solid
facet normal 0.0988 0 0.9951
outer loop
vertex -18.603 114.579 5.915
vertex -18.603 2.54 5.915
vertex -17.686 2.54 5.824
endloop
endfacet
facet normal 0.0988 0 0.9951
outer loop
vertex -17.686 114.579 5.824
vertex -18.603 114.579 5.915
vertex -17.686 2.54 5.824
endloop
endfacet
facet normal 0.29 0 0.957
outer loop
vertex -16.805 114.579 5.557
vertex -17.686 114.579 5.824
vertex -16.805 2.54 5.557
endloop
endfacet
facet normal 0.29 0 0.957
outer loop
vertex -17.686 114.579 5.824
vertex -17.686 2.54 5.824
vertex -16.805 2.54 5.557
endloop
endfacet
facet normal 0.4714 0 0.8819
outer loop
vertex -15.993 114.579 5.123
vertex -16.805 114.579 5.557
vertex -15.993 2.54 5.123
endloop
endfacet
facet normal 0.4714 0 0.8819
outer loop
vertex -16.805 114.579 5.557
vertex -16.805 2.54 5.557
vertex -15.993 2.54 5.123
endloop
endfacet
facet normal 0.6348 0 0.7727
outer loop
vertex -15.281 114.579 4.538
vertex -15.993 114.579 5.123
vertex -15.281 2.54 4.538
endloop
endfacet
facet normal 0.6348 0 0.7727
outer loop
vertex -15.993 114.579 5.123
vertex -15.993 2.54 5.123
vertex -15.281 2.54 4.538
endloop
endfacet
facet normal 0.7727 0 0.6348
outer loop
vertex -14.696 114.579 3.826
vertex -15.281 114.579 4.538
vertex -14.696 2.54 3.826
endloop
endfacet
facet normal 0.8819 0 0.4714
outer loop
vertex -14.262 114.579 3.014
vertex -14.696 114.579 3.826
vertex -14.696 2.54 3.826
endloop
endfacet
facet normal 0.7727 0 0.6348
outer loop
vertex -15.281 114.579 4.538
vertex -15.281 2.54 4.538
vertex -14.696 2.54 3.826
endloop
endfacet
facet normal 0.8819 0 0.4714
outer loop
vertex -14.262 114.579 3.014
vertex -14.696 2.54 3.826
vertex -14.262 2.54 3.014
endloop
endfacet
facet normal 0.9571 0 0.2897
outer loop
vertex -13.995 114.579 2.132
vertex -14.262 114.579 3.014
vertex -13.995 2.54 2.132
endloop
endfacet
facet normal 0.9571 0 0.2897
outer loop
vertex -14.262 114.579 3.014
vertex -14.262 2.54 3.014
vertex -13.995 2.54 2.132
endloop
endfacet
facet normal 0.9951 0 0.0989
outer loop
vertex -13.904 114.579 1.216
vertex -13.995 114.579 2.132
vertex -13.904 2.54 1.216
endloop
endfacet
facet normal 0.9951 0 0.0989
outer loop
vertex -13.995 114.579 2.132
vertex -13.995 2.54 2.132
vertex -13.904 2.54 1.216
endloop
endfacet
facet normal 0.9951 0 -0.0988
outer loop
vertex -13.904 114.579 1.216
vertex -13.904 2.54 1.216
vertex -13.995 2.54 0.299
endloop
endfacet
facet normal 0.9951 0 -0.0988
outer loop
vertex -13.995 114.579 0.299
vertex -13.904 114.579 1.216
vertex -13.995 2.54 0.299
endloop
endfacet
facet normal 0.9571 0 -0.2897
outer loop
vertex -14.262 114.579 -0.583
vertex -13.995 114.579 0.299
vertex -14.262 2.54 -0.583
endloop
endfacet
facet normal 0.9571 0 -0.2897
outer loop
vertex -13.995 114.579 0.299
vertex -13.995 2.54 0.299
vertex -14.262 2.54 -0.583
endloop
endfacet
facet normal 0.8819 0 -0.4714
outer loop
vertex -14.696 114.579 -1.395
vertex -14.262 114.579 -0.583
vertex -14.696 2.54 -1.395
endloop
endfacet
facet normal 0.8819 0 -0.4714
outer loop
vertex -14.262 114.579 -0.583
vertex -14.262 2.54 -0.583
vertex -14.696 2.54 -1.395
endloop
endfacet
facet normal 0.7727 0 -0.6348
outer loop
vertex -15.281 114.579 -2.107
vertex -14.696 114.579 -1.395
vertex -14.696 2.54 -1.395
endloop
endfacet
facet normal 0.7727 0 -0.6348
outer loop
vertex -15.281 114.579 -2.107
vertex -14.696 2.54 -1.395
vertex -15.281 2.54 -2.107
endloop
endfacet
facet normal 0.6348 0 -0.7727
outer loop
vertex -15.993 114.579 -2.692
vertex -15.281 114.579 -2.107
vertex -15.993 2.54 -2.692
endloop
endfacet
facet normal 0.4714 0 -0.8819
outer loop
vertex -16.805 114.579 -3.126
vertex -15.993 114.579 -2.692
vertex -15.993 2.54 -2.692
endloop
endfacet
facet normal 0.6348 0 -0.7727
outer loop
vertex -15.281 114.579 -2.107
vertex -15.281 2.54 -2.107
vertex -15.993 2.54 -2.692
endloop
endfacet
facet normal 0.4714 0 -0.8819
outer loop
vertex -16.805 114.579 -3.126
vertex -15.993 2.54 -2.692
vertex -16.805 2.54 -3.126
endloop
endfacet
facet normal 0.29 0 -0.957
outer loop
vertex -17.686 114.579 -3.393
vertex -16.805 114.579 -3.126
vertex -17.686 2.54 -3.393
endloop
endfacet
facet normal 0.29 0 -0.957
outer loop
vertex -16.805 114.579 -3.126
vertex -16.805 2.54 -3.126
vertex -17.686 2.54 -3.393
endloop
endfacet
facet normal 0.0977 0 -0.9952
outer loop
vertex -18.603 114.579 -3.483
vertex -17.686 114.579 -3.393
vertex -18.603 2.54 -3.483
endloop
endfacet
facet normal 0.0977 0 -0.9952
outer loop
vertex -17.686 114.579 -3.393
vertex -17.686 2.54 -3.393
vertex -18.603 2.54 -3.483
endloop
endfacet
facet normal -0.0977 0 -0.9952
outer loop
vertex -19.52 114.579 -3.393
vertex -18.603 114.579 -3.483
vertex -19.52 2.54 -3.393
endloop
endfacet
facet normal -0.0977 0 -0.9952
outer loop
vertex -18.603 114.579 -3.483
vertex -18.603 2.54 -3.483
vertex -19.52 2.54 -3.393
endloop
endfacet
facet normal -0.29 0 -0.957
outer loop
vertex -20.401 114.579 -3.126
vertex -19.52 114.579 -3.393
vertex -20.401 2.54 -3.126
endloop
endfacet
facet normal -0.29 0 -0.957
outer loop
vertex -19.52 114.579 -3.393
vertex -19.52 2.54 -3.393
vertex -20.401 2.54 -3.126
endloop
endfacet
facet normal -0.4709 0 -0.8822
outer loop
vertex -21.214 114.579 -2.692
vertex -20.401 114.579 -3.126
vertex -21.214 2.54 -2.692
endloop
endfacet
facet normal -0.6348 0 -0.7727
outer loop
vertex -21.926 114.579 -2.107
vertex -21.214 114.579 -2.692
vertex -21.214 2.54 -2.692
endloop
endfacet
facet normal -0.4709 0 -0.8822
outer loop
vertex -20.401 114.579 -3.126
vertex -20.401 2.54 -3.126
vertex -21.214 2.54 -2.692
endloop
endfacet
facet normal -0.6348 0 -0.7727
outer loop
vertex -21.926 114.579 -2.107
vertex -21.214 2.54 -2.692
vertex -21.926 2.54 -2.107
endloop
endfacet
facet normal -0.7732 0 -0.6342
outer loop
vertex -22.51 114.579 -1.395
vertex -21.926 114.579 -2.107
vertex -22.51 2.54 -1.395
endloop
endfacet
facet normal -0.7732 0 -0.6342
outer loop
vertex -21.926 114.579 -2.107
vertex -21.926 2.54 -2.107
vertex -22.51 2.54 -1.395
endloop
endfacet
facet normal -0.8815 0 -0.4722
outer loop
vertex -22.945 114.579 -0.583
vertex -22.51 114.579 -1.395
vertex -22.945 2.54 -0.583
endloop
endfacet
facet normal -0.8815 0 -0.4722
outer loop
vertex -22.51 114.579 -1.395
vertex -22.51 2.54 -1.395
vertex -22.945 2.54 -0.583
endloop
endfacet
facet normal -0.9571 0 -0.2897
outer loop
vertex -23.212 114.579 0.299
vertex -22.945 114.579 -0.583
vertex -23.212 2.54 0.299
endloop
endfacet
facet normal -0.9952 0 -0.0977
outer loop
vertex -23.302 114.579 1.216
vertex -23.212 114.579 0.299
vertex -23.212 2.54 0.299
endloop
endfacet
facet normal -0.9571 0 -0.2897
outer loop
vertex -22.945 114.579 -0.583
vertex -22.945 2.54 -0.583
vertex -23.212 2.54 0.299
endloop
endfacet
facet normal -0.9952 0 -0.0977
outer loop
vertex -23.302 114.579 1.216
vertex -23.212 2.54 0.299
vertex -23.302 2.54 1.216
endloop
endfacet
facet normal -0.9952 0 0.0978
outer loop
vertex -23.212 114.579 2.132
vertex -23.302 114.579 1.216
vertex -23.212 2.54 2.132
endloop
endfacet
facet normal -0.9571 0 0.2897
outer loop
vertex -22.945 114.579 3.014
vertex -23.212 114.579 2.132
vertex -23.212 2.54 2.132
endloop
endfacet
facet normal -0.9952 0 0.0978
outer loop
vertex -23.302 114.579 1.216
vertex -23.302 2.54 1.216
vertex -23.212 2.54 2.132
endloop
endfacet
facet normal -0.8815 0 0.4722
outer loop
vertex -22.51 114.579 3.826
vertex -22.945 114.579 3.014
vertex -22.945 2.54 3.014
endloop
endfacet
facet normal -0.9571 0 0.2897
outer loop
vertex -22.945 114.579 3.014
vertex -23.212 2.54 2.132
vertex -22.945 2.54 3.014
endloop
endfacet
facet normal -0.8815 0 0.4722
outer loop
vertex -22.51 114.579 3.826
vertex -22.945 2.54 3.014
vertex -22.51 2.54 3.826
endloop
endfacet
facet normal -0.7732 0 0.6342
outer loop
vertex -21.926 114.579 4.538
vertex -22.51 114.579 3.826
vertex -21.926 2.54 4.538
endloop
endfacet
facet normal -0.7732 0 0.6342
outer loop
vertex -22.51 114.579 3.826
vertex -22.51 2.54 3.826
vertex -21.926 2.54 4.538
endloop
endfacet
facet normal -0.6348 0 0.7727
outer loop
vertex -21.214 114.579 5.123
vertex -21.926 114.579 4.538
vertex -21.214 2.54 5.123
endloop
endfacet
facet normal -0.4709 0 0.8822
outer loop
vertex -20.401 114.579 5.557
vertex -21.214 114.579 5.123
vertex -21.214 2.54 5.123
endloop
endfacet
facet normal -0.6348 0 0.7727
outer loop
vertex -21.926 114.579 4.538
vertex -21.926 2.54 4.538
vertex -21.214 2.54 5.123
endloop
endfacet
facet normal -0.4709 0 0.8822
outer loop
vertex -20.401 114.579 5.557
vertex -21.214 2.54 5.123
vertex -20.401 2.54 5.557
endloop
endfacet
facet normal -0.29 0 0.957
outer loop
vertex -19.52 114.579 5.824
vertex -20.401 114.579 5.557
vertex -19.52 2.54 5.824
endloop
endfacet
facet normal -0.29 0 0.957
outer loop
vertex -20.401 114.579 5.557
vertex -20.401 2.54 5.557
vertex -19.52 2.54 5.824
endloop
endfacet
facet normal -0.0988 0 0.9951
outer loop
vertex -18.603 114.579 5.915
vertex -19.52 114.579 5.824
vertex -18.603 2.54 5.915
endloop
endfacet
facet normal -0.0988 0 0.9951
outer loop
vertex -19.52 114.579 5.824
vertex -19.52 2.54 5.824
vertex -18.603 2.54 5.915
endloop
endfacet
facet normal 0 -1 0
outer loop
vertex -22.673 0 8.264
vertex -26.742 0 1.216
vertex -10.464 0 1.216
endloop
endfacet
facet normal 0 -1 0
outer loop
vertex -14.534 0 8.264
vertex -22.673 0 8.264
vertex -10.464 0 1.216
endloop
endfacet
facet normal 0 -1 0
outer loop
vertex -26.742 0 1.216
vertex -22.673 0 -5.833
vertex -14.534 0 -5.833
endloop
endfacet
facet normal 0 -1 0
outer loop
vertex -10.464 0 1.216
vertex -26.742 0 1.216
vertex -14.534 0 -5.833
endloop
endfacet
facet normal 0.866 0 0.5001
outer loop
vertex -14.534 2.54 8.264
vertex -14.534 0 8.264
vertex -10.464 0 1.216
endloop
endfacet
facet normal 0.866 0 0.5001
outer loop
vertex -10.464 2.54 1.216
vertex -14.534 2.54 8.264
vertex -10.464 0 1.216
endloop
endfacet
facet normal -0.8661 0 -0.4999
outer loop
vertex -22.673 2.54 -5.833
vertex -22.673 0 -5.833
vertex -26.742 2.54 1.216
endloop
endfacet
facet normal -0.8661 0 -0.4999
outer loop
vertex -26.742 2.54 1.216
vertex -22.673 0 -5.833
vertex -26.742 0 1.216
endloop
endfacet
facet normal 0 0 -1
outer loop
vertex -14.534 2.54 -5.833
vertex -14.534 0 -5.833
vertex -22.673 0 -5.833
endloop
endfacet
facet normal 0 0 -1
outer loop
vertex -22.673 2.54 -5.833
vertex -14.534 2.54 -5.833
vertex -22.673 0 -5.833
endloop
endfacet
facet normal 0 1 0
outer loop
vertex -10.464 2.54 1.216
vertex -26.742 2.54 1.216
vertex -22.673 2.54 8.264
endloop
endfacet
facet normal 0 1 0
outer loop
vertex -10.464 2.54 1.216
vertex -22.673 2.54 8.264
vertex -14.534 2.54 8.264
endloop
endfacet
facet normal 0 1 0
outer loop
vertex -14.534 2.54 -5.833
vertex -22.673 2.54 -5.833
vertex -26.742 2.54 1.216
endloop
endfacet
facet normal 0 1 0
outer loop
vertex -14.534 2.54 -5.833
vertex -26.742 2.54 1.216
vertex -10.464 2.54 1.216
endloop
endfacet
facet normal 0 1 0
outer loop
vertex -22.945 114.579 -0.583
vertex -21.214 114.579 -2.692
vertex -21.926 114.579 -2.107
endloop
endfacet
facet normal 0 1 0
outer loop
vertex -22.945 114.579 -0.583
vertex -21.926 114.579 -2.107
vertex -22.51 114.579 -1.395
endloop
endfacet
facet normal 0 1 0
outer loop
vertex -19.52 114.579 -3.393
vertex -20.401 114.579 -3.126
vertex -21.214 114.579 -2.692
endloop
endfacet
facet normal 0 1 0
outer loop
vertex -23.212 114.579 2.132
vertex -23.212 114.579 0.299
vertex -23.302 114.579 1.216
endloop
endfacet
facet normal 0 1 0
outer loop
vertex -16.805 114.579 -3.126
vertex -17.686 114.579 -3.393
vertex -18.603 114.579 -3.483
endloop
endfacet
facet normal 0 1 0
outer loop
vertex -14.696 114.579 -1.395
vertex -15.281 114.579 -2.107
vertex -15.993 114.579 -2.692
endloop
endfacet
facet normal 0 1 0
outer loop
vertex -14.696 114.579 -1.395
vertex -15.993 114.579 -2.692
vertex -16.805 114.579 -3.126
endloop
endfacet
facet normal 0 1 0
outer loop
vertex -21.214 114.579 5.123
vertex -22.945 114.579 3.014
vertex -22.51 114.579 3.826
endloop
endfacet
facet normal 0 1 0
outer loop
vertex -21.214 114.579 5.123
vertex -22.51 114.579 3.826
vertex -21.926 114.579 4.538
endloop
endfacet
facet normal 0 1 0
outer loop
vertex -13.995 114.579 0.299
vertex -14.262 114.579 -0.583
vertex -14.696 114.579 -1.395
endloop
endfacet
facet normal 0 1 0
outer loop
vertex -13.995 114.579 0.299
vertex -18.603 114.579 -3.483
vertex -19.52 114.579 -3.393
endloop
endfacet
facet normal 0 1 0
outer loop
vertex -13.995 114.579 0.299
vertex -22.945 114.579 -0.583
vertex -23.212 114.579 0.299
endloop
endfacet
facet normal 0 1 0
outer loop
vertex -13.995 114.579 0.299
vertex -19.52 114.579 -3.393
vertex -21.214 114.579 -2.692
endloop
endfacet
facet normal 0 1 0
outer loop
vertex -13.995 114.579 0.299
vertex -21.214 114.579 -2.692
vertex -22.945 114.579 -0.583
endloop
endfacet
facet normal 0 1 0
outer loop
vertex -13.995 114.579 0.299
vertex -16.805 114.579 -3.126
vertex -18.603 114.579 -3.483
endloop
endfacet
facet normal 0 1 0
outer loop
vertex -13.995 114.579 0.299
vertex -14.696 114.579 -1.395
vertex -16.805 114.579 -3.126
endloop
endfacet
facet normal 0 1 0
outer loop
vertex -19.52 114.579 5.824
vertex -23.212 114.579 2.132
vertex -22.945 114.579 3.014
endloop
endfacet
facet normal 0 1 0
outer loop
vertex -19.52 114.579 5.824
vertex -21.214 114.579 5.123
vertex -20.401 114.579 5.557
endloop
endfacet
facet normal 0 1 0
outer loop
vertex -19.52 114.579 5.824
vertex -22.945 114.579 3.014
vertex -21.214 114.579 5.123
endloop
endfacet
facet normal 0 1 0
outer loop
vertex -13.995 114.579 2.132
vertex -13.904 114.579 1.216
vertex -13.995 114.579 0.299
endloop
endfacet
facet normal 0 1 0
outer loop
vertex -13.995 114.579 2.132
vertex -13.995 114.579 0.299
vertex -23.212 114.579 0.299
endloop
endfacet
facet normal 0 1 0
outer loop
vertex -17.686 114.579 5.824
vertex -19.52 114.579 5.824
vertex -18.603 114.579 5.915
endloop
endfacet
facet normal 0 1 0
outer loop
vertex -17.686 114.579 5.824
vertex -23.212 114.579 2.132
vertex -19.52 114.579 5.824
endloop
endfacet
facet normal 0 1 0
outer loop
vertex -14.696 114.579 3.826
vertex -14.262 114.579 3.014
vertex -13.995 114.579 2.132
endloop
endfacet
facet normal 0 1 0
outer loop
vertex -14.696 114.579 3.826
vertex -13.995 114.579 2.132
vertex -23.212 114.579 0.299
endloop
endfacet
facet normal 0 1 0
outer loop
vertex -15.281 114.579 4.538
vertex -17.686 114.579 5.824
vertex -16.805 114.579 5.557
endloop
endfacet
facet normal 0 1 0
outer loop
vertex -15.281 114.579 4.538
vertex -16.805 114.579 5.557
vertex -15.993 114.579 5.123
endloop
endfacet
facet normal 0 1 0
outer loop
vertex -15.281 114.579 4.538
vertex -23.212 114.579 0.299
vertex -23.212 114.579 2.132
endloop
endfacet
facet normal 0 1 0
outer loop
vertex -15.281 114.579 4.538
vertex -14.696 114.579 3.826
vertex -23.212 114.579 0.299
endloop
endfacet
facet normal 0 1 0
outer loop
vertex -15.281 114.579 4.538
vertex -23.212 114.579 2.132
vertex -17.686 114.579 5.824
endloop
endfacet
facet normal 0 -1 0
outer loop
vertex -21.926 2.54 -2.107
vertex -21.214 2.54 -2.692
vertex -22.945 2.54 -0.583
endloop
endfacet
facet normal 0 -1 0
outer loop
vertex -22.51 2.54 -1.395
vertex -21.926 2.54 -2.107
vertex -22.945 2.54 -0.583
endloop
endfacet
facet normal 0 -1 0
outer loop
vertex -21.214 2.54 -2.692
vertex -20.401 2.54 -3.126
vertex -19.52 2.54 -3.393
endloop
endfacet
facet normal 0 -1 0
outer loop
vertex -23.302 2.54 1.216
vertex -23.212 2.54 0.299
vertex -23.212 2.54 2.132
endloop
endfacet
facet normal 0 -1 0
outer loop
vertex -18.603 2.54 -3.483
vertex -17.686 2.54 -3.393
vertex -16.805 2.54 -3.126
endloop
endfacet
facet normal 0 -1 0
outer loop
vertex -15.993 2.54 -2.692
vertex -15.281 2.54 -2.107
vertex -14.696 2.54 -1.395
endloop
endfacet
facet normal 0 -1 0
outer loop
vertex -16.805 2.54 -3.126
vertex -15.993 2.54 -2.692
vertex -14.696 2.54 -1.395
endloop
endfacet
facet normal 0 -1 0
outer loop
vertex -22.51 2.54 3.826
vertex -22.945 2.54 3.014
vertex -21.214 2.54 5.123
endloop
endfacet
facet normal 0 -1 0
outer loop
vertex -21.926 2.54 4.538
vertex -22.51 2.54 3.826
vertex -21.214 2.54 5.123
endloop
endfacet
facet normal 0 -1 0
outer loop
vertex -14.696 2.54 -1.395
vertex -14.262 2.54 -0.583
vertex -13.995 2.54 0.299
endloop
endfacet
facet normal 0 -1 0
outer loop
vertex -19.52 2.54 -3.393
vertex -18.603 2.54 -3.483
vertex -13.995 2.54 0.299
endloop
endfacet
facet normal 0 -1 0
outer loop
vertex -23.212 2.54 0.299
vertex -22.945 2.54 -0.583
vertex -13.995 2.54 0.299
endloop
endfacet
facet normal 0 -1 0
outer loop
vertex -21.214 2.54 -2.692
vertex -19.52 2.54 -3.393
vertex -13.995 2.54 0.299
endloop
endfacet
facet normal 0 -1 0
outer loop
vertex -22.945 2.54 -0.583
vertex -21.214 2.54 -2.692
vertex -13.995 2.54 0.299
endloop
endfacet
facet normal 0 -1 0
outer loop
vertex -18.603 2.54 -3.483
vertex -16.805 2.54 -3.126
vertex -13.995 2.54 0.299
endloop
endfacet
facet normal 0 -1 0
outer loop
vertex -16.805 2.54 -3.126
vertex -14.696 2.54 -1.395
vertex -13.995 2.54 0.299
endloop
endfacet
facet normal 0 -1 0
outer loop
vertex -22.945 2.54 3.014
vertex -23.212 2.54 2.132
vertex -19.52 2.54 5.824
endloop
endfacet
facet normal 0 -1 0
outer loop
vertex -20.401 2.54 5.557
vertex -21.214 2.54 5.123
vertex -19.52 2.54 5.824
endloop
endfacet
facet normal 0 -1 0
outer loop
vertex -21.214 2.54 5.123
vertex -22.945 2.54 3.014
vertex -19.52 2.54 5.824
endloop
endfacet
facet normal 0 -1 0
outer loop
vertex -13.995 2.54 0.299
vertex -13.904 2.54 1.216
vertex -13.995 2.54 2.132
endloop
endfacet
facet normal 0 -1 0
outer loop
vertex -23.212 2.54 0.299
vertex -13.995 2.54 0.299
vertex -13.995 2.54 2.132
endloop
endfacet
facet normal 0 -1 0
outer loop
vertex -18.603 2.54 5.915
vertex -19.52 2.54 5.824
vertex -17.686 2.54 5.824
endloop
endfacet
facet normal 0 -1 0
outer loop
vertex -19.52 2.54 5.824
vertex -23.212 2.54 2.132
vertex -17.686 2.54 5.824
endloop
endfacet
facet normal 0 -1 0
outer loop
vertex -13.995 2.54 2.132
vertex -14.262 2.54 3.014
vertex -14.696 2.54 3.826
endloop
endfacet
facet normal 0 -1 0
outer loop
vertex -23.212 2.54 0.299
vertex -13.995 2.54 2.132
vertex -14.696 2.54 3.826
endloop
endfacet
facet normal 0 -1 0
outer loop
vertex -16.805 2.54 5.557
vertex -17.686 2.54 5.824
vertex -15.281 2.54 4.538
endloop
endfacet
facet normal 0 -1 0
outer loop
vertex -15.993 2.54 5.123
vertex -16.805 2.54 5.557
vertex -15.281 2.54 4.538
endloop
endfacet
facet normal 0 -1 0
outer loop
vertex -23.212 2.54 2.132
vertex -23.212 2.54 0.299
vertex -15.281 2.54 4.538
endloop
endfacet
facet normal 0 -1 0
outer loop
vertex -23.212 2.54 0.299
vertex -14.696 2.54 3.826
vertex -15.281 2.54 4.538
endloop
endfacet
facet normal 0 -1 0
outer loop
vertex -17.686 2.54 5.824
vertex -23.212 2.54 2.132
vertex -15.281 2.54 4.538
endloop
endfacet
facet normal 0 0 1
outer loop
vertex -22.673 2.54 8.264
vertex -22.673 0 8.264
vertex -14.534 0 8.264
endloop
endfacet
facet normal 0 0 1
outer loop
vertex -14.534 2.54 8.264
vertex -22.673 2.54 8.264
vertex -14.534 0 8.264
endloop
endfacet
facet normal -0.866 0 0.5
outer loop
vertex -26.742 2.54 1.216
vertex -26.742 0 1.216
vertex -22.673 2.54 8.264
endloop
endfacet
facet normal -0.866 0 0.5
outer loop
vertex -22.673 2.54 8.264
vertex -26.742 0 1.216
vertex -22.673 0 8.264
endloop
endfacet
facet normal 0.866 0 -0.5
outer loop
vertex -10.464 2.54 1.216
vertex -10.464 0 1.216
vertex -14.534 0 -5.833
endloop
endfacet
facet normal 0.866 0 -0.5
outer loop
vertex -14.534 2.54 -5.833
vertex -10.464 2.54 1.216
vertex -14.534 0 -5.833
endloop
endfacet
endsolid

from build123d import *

# Parameters (mm, degrees)
BOSS_EXTRUDE1_DEPTH = 2.54
SKETCH2_R           = 4.699
BOSS_EXTRUDE2_DEPTH = 112.0394


with BuildPart() as part:
    # Sketch1 → Boss-Extrude1 (new body)
    with BuildSketch(Plane(origin=(0, 0, 0), x_dir=(1, 0, 0), z_dir=(0, 1, 0))):
        Polygon((-10.464308672, -1.215551007), (-14.533762044, 5.832948993), (-22.672668789, 5.832948993), (-26.742122161, -1.215551007), (-22.672668789, -8.264051007), (-14.533762044, -8.264051007), align=None)
    extrude(amount=BOSS_EXTRUDE1_DEPTH)


with BuildPart() as body_2:
    # Sketch2 → Boss-Extrude2 (new body)
    with BuildSketch(Plane(origin=(0, 2.54, 0), x_dir=(1, 0, 0), z_dir=(0, 1, 0))):
        with Locations(Location((-18.603215417, -1.215551007, 0), (0, 0, 270))):
            Circle(SKETCH2_R)
    extrude(amount=BOSS_EXTRUDE2_DEPTH)


solid = Compound([part.part, body_2.part])
